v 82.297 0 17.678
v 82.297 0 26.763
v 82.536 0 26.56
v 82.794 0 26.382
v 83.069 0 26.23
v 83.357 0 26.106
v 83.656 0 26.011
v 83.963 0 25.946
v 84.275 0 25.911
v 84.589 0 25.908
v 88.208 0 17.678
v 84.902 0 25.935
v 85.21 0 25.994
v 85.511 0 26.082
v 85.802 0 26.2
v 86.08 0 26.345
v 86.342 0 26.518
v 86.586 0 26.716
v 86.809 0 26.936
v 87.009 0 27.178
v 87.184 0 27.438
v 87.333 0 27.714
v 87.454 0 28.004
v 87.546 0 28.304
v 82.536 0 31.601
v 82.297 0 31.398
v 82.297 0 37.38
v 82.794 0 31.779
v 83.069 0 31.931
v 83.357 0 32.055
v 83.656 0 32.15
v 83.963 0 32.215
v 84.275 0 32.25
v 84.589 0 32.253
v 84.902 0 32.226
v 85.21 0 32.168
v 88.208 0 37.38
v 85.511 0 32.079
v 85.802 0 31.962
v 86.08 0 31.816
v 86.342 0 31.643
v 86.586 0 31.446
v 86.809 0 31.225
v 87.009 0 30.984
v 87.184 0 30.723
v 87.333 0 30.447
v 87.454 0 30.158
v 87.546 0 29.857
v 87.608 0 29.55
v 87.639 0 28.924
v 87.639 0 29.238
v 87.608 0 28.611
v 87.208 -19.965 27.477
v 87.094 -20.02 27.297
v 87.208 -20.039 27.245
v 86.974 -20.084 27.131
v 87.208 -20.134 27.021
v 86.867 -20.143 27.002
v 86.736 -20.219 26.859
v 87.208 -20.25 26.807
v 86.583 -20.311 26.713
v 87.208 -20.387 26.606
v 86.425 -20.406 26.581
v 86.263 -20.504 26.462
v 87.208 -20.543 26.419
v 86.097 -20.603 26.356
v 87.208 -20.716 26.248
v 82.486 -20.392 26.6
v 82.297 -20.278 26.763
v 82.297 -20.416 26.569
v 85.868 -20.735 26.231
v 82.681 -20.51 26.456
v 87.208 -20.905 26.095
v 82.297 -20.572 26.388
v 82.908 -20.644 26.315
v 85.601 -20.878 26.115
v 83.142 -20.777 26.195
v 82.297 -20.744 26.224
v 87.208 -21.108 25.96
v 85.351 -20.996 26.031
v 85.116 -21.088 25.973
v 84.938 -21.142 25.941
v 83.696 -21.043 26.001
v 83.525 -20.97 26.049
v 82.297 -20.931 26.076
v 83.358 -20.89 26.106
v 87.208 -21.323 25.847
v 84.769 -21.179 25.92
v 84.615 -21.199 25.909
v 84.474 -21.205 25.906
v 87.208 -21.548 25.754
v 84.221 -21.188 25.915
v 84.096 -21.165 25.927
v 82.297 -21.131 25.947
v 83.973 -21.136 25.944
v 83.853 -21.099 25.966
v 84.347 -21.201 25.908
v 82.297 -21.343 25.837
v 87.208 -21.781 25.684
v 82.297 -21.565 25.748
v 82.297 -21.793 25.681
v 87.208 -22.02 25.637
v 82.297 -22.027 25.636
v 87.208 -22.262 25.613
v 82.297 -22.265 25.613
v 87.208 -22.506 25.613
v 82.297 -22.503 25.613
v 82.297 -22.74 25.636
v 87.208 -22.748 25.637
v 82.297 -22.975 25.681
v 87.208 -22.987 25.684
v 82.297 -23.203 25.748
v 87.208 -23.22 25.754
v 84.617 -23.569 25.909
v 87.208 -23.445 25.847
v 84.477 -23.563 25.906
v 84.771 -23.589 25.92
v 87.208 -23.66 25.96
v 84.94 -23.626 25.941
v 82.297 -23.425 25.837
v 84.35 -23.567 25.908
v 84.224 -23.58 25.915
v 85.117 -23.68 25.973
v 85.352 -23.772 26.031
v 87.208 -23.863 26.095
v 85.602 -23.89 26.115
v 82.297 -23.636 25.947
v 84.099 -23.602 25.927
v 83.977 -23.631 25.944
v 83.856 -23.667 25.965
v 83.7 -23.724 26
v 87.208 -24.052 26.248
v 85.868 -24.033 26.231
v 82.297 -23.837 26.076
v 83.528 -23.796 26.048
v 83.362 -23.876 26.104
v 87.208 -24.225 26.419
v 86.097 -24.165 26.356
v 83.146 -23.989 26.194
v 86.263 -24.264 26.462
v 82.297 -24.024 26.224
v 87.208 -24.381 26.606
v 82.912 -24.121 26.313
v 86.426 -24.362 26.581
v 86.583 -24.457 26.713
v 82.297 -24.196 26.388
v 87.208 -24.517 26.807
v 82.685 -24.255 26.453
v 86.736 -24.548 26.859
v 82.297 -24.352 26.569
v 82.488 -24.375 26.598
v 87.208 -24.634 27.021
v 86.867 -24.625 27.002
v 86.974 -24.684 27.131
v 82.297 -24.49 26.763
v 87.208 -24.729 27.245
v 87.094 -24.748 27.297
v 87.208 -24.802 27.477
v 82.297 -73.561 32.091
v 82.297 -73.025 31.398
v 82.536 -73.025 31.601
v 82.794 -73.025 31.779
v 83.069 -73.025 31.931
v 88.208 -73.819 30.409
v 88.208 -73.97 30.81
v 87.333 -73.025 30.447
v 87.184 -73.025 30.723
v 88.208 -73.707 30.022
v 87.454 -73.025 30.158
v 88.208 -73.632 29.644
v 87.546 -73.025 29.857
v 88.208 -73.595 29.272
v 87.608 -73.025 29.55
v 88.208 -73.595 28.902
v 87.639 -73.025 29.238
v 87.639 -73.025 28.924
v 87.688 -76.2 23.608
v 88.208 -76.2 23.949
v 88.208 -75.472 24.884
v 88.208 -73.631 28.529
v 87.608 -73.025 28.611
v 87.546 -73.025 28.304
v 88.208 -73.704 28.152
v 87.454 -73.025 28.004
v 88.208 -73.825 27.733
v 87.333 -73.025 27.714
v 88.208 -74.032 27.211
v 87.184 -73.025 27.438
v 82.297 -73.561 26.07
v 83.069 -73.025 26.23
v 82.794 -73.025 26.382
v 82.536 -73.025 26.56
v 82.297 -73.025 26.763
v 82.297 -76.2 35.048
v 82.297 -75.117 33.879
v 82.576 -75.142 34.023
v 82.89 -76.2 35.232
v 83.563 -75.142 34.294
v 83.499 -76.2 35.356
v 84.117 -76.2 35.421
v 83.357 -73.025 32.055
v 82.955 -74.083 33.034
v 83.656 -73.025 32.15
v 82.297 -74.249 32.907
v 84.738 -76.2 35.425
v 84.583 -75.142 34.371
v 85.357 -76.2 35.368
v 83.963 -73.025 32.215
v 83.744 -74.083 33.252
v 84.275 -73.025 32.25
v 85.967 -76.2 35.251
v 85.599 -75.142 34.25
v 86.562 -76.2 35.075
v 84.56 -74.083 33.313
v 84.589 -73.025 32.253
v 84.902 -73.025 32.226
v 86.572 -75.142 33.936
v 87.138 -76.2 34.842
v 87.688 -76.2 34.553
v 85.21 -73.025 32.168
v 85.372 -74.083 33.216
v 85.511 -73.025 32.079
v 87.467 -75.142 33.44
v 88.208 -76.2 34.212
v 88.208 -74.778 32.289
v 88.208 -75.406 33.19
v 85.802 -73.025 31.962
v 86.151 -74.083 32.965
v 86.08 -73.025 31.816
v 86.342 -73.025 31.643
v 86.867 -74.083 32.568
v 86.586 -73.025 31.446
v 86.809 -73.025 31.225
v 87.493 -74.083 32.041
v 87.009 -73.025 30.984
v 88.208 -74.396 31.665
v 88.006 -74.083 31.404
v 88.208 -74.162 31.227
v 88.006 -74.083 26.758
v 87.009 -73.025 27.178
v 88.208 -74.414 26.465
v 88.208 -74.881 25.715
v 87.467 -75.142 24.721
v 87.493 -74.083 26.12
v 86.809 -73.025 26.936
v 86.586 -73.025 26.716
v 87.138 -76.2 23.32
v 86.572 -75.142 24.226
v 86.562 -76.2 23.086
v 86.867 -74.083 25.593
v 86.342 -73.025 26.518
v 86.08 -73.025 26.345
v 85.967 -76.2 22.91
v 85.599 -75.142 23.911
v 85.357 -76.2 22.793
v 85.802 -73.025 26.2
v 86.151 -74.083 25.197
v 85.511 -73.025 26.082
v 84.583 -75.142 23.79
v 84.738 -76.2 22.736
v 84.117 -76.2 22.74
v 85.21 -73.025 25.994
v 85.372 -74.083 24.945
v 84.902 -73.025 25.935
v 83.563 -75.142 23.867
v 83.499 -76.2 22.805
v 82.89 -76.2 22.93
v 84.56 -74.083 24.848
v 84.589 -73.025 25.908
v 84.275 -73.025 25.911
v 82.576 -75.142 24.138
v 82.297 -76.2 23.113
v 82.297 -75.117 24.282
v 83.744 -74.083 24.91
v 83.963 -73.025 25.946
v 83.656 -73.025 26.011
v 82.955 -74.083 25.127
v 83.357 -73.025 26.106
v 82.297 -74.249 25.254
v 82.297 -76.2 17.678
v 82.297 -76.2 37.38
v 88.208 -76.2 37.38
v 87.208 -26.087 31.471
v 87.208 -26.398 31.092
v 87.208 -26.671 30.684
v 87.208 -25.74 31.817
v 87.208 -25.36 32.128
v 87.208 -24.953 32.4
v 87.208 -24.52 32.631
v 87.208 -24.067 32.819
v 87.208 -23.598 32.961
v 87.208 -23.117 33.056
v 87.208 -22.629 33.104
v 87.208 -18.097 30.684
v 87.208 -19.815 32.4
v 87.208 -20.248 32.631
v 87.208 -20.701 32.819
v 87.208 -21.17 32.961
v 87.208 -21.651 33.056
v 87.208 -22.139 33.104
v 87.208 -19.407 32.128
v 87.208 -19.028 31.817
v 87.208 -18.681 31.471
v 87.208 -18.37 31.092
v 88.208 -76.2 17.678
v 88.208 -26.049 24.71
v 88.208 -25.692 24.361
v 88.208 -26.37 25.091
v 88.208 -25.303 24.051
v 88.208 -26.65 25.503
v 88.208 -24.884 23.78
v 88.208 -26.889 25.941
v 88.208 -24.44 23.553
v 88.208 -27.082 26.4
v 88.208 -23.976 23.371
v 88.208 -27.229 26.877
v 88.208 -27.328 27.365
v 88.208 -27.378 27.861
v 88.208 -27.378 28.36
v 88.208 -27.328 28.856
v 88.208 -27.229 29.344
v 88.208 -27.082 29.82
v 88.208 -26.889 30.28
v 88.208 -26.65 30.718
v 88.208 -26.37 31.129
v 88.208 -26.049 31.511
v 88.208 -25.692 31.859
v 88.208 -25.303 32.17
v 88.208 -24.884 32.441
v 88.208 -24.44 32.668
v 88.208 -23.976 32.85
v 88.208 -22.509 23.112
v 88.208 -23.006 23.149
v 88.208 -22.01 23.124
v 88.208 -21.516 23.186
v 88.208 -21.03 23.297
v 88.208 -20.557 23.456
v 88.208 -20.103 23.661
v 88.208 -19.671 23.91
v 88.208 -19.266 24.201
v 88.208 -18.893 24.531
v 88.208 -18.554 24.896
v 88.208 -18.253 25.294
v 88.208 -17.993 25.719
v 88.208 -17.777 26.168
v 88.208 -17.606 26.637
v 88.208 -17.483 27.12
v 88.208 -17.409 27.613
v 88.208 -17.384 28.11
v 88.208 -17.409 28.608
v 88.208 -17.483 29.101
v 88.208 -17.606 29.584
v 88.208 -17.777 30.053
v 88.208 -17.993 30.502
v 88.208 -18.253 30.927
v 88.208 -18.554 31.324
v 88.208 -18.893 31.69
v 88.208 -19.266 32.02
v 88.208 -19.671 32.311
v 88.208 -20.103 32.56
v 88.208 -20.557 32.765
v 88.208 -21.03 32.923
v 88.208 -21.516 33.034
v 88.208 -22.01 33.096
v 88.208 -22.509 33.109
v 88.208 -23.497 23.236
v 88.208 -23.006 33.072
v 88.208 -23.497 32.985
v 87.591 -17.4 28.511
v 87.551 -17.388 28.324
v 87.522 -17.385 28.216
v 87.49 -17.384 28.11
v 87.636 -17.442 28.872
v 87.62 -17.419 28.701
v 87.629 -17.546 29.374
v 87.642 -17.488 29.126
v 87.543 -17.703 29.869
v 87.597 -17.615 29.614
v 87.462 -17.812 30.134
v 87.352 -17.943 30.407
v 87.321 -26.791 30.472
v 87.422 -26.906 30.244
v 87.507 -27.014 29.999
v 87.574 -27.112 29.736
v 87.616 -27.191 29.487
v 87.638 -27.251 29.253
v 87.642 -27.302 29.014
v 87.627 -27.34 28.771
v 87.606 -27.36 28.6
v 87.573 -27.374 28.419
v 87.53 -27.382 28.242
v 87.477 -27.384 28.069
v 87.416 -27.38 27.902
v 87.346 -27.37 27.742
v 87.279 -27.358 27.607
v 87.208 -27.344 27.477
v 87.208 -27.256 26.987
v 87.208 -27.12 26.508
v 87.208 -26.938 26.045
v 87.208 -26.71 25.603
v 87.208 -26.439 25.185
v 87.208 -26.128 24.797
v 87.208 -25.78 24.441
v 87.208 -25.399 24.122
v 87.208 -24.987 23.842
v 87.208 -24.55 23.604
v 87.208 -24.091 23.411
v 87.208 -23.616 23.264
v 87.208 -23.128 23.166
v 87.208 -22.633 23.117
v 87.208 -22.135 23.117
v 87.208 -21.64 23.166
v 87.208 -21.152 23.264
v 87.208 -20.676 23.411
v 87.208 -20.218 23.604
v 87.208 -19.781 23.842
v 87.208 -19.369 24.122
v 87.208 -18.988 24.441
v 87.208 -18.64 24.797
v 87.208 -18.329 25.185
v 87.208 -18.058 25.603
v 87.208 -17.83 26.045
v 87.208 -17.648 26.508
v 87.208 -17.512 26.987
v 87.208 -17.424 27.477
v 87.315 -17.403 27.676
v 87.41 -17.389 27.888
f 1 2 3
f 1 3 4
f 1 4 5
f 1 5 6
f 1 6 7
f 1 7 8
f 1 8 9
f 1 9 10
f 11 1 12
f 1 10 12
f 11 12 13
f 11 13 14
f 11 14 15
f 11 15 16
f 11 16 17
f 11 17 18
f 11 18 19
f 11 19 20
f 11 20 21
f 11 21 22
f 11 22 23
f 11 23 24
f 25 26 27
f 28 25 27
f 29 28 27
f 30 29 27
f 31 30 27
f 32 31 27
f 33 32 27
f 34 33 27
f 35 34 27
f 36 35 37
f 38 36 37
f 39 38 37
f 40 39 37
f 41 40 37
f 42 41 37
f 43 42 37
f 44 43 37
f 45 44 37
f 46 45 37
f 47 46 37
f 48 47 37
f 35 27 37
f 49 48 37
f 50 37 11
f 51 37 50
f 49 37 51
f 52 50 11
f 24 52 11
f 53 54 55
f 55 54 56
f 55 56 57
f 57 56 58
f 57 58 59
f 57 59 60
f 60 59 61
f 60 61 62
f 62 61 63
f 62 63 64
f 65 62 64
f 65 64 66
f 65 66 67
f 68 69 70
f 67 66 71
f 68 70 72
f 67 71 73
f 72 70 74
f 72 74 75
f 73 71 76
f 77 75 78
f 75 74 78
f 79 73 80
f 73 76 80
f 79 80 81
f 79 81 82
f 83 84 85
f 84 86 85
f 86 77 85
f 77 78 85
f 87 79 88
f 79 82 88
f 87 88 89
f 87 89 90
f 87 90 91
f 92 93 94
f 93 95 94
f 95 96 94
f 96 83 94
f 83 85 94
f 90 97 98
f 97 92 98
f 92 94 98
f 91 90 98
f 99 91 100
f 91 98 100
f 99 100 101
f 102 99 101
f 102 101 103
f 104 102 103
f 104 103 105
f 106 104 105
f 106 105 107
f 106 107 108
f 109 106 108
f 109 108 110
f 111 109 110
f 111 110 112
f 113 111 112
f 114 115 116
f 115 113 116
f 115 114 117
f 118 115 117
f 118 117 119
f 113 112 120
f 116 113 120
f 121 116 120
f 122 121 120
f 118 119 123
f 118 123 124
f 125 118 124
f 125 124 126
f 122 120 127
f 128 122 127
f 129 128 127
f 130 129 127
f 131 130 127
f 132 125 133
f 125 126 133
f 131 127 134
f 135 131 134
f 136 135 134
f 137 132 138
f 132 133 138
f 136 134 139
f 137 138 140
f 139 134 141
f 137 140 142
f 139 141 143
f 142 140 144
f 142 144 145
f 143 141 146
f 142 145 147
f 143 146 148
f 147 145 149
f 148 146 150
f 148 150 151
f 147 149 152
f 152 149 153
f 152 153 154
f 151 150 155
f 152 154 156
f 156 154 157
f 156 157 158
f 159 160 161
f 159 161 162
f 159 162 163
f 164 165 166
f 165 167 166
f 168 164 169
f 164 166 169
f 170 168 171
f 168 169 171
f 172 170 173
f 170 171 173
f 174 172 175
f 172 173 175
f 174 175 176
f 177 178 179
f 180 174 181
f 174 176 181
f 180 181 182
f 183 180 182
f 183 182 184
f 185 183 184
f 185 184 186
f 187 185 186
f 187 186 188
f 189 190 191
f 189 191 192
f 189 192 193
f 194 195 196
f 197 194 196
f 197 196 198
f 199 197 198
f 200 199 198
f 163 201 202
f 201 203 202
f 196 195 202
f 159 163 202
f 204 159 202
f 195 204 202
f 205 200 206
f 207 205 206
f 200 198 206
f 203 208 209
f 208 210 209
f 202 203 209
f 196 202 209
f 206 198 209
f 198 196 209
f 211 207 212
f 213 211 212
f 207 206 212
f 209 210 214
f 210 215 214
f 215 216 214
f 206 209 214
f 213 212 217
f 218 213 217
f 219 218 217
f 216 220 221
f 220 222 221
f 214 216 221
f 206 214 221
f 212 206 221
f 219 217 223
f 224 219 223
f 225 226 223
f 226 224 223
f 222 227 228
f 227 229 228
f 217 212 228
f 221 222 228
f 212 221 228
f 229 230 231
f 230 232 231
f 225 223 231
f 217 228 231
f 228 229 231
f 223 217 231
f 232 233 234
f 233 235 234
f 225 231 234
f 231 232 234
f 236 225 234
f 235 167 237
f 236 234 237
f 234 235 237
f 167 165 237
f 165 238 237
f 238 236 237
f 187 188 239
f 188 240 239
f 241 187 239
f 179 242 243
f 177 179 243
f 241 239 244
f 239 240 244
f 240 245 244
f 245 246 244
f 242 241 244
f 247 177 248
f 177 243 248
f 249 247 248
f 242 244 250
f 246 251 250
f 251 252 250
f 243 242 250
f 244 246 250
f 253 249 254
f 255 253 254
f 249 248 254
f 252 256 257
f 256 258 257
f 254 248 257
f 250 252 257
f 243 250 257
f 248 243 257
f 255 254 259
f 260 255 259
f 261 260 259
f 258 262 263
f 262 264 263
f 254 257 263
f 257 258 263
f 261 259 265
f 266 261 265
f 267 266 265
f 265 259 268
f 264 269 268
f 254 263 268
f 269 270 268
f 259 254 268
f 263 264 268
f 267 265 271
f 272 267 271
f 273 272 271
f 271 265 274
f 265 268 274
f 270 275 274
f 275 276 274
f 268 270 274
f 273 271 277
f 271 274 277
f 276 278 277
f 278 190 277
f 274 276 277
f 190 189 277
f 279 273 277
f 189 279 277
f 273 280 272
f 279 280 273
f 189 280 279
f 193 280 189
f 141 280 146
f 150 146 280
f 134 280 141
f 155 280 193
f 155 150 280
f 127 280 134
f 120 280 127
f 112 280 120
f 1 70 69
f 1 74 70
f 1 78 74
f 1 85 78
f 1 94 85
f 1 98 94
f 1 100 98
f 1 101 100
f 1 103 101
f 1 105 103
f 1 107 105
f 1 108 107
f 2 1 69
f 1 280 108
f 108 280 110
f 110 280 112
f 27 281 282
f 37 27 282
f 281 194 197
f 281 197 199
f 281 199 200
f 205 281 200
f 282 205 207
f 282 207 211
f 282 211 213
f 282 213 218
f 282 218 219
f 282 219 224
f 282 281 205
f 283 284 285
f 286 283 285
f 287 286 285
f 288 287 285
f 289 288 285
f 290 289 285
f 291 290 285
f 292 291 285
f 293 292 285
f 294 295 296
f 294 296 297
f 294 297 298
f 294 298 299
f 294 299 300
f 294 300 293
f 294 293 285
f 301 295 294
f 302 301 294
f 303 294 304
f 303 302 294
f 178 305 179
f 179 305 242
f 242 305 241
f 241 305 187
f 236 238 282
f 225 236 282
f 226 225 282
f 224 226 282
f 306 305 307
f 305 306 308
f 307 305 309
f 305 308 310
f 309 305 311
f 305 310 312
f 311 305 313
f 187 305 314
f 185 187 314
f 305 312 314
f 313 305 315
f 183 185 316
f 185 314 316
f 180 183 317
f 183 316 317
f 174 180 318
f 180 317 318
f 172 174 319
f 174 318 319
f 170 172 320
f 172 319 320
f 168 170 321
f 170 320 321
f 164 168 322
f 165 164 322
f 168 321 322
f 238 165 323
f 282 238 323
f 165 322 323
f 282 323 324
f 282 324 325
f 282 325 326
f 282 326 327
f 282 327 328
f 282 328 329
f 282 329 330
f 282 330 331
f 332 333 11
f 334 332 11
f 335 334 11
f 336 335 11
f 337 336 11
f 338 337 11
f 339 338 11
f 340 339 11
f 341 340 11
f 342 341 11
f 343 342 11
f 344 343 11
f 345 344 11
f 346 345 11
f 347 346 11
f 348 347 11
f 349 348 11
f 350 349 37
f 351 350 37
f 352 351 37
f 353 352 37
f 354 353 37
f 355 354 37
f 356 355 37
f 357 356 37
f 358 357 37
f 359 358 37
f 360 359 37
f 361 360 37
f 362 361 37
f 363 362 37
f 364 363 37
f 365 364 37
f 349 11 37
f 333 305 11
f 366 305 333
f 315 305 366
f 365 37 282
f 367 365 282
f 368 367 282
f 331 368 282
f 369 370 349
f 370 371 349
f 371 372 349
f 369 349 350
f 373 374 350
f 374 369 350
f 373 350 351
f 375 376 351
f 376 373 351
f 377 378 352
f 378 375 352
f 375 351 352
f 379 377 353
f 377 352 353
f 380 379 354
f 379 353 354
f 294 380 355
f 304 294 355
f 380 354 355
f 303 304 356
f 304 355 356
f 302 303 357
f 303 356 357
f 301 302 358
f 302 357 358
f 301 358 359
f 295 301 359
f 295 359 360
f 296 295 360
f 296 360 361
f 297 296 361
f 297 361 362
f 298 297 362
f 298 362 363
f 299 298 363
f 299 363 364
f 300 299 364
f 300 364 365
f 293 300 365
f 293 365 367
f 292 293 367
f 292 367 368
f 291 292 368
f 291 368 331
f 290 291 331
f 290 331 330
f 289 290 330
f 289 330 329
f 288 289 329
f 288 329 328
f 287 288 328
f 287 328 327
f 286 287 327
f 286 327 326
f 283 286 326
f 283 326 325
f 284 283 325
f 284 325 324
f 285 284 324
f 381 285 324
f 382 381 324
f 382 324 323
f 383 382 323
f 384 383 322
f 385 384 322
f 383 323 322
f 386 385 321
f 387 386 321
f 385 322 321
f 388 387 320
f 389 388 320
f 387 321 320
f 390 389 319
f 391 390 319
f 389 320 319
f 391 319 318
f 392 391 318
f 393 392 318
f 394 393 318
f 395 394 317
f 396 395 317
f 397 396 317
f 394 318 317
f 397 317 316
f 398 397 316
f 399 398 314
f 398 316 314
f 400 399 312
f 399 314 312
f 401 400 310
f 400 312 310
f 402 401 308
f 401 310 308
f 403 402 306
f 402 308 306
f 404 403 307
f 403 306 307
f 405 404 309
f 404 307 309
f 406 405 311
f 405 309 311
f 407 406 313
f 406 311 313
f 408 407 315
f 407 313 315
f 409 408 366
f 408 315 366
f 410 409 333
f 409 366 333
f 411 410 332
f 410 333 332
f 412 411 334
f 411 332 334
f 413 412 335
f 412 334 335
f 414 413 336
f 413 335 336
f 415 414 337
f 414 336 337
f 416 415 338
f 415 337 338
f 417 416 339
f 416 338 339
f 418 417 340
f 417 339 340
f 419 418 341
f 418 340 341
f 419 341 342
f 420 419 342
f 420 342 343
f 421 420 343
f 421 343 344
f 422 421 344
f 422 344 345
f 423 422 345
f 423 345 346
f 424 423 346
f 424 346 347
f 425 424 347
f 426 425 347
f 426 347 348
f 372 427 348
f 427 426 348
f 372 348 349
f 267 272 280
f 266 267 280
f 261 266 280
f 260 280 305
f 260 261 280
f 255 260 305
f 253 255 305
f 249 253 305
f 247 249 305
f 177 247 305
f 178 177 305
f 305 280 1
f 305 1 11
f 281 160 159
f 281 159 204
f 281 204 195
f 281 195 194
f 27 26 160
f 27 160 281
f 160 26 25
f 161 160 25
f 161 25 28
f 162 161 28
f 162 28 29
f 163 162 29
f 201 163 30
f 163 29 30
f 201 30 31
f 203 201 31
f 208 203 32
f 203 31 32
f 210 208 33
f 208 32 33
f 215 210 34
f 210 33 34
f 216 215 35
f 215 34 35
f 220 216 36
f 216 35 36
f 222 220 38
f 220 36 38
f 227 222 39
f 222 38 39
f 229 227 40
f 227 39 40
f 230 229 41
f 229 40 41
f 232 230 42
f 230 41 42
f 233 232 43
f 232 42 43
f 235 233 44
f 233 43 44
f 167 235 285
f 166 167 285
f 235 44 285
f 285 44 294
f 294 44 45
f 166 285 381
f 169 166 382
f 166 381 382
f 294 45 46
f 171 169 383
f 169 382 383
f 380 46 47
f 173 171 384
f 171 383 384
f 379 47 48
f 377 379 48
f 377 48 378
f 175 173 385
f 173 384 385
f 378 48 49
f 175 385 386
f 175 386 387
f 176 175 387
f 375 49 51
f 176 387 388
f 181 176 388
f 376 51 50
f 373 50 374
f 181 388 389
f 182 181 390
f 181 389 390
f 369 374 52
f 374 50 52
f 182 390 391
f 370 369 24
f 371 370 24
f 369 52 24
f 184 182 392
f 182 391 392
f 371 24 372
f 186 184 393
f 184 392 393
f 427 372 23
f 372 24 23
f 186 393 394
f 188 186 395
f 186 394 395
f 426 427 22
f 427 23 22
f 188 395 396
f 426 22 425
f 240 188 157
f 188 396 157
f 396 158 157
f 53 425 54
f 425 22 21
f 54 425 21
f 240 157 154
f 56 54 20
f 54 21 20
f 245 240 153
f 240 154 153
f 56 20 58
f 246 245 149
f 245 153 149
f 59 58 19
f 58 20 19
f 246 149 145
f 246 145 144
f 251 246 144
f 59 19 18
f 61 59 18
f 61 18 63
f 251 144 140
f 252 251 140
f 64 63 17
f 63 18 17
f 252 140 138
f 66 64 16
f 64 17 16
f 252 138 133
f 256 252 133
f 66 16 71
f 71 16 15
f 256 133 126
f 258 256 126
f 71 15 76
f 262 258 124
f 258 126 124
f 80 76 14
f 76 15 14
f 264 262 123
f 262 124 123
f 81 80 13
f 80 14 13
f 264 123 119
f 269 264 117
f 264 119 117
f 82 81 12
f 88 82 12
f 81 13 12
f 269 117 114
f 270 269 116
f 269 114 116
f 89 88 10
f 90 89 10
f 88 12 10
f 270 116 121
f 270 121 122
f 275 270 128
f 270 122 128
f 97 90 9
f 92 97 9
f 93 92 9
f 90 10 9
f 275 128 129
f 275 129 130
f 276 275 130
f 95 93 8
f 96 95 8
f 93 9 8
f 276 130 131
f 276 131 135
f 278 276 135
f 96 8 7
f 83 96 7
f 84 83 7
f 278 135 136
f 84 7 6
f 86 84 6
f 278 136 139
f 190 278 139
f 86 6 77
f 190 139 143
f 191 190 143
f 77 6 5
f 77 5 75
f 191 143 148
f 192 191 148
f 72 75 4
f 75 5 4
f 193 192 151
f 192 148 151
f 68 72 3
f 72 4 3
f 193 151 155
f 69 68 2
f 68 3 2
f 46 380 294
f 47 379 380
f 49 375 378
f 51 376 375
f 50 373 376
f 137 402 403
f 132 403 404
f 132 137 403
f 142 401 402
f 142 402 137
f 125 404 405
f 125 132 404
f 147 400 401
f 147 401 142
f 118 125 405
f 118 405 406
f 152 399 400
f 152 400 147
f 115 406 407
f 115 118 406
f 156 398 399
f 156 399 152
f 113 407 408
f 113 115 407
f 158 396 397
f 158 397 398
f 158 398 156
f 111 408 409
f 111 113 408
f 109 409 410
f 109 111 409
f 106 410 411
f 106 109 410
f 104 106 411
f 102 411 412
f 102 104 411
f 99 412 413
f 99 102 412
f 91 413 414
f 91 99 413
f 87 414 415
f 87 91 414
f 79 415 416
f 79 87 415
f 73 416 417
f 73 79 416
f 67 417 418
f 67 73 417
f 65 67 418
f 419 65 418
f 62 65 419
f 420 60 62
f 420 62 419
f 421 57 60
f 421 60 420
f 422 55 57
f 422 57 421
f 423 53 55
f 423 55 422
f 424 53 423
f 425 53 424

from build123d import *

# Parameters (mm, degrees)
F0_W           = 5.910679
F0_H           = 19.702202
F1_DEPTH       = 76.2
F3_D           = 6.35
F3_CSINK_D     = 12.7
F3_CSINK_ANGLE = 90
F5_D           = 5
F5_CBORE_D     = 10
F5_CBORE_DEPTH = 1


with BuildPart() as f1:
    # F0 (on Front) → F1 (new body)
    with BuildSketch(Plane.XZ):
        with Locations((85.252292, 27.52936)):
            Rectangle(F0_W, F0_H)
    extrude(amount=F1_DEPTH)

    # F3 (through all)
    with Locations(Plane.XZ.offset(76.2)):
        with Locations((84.467381, 29.080626)):
            CounterSinkHole(F3_D / 2, F3_CSINK_D / 2, counter_sink_angle=F3_CSINK_ANGLE)

    # F5 (through all)
    with Locations(Plane.YZ.offset(88.207632)):
        with Locations((-22.383902, 28.110377)):
            CounterBoreHole(F5_D / 2, F5_CBORE_D / 2, F5_CBORE_DEPTH)


solid = f1.part
